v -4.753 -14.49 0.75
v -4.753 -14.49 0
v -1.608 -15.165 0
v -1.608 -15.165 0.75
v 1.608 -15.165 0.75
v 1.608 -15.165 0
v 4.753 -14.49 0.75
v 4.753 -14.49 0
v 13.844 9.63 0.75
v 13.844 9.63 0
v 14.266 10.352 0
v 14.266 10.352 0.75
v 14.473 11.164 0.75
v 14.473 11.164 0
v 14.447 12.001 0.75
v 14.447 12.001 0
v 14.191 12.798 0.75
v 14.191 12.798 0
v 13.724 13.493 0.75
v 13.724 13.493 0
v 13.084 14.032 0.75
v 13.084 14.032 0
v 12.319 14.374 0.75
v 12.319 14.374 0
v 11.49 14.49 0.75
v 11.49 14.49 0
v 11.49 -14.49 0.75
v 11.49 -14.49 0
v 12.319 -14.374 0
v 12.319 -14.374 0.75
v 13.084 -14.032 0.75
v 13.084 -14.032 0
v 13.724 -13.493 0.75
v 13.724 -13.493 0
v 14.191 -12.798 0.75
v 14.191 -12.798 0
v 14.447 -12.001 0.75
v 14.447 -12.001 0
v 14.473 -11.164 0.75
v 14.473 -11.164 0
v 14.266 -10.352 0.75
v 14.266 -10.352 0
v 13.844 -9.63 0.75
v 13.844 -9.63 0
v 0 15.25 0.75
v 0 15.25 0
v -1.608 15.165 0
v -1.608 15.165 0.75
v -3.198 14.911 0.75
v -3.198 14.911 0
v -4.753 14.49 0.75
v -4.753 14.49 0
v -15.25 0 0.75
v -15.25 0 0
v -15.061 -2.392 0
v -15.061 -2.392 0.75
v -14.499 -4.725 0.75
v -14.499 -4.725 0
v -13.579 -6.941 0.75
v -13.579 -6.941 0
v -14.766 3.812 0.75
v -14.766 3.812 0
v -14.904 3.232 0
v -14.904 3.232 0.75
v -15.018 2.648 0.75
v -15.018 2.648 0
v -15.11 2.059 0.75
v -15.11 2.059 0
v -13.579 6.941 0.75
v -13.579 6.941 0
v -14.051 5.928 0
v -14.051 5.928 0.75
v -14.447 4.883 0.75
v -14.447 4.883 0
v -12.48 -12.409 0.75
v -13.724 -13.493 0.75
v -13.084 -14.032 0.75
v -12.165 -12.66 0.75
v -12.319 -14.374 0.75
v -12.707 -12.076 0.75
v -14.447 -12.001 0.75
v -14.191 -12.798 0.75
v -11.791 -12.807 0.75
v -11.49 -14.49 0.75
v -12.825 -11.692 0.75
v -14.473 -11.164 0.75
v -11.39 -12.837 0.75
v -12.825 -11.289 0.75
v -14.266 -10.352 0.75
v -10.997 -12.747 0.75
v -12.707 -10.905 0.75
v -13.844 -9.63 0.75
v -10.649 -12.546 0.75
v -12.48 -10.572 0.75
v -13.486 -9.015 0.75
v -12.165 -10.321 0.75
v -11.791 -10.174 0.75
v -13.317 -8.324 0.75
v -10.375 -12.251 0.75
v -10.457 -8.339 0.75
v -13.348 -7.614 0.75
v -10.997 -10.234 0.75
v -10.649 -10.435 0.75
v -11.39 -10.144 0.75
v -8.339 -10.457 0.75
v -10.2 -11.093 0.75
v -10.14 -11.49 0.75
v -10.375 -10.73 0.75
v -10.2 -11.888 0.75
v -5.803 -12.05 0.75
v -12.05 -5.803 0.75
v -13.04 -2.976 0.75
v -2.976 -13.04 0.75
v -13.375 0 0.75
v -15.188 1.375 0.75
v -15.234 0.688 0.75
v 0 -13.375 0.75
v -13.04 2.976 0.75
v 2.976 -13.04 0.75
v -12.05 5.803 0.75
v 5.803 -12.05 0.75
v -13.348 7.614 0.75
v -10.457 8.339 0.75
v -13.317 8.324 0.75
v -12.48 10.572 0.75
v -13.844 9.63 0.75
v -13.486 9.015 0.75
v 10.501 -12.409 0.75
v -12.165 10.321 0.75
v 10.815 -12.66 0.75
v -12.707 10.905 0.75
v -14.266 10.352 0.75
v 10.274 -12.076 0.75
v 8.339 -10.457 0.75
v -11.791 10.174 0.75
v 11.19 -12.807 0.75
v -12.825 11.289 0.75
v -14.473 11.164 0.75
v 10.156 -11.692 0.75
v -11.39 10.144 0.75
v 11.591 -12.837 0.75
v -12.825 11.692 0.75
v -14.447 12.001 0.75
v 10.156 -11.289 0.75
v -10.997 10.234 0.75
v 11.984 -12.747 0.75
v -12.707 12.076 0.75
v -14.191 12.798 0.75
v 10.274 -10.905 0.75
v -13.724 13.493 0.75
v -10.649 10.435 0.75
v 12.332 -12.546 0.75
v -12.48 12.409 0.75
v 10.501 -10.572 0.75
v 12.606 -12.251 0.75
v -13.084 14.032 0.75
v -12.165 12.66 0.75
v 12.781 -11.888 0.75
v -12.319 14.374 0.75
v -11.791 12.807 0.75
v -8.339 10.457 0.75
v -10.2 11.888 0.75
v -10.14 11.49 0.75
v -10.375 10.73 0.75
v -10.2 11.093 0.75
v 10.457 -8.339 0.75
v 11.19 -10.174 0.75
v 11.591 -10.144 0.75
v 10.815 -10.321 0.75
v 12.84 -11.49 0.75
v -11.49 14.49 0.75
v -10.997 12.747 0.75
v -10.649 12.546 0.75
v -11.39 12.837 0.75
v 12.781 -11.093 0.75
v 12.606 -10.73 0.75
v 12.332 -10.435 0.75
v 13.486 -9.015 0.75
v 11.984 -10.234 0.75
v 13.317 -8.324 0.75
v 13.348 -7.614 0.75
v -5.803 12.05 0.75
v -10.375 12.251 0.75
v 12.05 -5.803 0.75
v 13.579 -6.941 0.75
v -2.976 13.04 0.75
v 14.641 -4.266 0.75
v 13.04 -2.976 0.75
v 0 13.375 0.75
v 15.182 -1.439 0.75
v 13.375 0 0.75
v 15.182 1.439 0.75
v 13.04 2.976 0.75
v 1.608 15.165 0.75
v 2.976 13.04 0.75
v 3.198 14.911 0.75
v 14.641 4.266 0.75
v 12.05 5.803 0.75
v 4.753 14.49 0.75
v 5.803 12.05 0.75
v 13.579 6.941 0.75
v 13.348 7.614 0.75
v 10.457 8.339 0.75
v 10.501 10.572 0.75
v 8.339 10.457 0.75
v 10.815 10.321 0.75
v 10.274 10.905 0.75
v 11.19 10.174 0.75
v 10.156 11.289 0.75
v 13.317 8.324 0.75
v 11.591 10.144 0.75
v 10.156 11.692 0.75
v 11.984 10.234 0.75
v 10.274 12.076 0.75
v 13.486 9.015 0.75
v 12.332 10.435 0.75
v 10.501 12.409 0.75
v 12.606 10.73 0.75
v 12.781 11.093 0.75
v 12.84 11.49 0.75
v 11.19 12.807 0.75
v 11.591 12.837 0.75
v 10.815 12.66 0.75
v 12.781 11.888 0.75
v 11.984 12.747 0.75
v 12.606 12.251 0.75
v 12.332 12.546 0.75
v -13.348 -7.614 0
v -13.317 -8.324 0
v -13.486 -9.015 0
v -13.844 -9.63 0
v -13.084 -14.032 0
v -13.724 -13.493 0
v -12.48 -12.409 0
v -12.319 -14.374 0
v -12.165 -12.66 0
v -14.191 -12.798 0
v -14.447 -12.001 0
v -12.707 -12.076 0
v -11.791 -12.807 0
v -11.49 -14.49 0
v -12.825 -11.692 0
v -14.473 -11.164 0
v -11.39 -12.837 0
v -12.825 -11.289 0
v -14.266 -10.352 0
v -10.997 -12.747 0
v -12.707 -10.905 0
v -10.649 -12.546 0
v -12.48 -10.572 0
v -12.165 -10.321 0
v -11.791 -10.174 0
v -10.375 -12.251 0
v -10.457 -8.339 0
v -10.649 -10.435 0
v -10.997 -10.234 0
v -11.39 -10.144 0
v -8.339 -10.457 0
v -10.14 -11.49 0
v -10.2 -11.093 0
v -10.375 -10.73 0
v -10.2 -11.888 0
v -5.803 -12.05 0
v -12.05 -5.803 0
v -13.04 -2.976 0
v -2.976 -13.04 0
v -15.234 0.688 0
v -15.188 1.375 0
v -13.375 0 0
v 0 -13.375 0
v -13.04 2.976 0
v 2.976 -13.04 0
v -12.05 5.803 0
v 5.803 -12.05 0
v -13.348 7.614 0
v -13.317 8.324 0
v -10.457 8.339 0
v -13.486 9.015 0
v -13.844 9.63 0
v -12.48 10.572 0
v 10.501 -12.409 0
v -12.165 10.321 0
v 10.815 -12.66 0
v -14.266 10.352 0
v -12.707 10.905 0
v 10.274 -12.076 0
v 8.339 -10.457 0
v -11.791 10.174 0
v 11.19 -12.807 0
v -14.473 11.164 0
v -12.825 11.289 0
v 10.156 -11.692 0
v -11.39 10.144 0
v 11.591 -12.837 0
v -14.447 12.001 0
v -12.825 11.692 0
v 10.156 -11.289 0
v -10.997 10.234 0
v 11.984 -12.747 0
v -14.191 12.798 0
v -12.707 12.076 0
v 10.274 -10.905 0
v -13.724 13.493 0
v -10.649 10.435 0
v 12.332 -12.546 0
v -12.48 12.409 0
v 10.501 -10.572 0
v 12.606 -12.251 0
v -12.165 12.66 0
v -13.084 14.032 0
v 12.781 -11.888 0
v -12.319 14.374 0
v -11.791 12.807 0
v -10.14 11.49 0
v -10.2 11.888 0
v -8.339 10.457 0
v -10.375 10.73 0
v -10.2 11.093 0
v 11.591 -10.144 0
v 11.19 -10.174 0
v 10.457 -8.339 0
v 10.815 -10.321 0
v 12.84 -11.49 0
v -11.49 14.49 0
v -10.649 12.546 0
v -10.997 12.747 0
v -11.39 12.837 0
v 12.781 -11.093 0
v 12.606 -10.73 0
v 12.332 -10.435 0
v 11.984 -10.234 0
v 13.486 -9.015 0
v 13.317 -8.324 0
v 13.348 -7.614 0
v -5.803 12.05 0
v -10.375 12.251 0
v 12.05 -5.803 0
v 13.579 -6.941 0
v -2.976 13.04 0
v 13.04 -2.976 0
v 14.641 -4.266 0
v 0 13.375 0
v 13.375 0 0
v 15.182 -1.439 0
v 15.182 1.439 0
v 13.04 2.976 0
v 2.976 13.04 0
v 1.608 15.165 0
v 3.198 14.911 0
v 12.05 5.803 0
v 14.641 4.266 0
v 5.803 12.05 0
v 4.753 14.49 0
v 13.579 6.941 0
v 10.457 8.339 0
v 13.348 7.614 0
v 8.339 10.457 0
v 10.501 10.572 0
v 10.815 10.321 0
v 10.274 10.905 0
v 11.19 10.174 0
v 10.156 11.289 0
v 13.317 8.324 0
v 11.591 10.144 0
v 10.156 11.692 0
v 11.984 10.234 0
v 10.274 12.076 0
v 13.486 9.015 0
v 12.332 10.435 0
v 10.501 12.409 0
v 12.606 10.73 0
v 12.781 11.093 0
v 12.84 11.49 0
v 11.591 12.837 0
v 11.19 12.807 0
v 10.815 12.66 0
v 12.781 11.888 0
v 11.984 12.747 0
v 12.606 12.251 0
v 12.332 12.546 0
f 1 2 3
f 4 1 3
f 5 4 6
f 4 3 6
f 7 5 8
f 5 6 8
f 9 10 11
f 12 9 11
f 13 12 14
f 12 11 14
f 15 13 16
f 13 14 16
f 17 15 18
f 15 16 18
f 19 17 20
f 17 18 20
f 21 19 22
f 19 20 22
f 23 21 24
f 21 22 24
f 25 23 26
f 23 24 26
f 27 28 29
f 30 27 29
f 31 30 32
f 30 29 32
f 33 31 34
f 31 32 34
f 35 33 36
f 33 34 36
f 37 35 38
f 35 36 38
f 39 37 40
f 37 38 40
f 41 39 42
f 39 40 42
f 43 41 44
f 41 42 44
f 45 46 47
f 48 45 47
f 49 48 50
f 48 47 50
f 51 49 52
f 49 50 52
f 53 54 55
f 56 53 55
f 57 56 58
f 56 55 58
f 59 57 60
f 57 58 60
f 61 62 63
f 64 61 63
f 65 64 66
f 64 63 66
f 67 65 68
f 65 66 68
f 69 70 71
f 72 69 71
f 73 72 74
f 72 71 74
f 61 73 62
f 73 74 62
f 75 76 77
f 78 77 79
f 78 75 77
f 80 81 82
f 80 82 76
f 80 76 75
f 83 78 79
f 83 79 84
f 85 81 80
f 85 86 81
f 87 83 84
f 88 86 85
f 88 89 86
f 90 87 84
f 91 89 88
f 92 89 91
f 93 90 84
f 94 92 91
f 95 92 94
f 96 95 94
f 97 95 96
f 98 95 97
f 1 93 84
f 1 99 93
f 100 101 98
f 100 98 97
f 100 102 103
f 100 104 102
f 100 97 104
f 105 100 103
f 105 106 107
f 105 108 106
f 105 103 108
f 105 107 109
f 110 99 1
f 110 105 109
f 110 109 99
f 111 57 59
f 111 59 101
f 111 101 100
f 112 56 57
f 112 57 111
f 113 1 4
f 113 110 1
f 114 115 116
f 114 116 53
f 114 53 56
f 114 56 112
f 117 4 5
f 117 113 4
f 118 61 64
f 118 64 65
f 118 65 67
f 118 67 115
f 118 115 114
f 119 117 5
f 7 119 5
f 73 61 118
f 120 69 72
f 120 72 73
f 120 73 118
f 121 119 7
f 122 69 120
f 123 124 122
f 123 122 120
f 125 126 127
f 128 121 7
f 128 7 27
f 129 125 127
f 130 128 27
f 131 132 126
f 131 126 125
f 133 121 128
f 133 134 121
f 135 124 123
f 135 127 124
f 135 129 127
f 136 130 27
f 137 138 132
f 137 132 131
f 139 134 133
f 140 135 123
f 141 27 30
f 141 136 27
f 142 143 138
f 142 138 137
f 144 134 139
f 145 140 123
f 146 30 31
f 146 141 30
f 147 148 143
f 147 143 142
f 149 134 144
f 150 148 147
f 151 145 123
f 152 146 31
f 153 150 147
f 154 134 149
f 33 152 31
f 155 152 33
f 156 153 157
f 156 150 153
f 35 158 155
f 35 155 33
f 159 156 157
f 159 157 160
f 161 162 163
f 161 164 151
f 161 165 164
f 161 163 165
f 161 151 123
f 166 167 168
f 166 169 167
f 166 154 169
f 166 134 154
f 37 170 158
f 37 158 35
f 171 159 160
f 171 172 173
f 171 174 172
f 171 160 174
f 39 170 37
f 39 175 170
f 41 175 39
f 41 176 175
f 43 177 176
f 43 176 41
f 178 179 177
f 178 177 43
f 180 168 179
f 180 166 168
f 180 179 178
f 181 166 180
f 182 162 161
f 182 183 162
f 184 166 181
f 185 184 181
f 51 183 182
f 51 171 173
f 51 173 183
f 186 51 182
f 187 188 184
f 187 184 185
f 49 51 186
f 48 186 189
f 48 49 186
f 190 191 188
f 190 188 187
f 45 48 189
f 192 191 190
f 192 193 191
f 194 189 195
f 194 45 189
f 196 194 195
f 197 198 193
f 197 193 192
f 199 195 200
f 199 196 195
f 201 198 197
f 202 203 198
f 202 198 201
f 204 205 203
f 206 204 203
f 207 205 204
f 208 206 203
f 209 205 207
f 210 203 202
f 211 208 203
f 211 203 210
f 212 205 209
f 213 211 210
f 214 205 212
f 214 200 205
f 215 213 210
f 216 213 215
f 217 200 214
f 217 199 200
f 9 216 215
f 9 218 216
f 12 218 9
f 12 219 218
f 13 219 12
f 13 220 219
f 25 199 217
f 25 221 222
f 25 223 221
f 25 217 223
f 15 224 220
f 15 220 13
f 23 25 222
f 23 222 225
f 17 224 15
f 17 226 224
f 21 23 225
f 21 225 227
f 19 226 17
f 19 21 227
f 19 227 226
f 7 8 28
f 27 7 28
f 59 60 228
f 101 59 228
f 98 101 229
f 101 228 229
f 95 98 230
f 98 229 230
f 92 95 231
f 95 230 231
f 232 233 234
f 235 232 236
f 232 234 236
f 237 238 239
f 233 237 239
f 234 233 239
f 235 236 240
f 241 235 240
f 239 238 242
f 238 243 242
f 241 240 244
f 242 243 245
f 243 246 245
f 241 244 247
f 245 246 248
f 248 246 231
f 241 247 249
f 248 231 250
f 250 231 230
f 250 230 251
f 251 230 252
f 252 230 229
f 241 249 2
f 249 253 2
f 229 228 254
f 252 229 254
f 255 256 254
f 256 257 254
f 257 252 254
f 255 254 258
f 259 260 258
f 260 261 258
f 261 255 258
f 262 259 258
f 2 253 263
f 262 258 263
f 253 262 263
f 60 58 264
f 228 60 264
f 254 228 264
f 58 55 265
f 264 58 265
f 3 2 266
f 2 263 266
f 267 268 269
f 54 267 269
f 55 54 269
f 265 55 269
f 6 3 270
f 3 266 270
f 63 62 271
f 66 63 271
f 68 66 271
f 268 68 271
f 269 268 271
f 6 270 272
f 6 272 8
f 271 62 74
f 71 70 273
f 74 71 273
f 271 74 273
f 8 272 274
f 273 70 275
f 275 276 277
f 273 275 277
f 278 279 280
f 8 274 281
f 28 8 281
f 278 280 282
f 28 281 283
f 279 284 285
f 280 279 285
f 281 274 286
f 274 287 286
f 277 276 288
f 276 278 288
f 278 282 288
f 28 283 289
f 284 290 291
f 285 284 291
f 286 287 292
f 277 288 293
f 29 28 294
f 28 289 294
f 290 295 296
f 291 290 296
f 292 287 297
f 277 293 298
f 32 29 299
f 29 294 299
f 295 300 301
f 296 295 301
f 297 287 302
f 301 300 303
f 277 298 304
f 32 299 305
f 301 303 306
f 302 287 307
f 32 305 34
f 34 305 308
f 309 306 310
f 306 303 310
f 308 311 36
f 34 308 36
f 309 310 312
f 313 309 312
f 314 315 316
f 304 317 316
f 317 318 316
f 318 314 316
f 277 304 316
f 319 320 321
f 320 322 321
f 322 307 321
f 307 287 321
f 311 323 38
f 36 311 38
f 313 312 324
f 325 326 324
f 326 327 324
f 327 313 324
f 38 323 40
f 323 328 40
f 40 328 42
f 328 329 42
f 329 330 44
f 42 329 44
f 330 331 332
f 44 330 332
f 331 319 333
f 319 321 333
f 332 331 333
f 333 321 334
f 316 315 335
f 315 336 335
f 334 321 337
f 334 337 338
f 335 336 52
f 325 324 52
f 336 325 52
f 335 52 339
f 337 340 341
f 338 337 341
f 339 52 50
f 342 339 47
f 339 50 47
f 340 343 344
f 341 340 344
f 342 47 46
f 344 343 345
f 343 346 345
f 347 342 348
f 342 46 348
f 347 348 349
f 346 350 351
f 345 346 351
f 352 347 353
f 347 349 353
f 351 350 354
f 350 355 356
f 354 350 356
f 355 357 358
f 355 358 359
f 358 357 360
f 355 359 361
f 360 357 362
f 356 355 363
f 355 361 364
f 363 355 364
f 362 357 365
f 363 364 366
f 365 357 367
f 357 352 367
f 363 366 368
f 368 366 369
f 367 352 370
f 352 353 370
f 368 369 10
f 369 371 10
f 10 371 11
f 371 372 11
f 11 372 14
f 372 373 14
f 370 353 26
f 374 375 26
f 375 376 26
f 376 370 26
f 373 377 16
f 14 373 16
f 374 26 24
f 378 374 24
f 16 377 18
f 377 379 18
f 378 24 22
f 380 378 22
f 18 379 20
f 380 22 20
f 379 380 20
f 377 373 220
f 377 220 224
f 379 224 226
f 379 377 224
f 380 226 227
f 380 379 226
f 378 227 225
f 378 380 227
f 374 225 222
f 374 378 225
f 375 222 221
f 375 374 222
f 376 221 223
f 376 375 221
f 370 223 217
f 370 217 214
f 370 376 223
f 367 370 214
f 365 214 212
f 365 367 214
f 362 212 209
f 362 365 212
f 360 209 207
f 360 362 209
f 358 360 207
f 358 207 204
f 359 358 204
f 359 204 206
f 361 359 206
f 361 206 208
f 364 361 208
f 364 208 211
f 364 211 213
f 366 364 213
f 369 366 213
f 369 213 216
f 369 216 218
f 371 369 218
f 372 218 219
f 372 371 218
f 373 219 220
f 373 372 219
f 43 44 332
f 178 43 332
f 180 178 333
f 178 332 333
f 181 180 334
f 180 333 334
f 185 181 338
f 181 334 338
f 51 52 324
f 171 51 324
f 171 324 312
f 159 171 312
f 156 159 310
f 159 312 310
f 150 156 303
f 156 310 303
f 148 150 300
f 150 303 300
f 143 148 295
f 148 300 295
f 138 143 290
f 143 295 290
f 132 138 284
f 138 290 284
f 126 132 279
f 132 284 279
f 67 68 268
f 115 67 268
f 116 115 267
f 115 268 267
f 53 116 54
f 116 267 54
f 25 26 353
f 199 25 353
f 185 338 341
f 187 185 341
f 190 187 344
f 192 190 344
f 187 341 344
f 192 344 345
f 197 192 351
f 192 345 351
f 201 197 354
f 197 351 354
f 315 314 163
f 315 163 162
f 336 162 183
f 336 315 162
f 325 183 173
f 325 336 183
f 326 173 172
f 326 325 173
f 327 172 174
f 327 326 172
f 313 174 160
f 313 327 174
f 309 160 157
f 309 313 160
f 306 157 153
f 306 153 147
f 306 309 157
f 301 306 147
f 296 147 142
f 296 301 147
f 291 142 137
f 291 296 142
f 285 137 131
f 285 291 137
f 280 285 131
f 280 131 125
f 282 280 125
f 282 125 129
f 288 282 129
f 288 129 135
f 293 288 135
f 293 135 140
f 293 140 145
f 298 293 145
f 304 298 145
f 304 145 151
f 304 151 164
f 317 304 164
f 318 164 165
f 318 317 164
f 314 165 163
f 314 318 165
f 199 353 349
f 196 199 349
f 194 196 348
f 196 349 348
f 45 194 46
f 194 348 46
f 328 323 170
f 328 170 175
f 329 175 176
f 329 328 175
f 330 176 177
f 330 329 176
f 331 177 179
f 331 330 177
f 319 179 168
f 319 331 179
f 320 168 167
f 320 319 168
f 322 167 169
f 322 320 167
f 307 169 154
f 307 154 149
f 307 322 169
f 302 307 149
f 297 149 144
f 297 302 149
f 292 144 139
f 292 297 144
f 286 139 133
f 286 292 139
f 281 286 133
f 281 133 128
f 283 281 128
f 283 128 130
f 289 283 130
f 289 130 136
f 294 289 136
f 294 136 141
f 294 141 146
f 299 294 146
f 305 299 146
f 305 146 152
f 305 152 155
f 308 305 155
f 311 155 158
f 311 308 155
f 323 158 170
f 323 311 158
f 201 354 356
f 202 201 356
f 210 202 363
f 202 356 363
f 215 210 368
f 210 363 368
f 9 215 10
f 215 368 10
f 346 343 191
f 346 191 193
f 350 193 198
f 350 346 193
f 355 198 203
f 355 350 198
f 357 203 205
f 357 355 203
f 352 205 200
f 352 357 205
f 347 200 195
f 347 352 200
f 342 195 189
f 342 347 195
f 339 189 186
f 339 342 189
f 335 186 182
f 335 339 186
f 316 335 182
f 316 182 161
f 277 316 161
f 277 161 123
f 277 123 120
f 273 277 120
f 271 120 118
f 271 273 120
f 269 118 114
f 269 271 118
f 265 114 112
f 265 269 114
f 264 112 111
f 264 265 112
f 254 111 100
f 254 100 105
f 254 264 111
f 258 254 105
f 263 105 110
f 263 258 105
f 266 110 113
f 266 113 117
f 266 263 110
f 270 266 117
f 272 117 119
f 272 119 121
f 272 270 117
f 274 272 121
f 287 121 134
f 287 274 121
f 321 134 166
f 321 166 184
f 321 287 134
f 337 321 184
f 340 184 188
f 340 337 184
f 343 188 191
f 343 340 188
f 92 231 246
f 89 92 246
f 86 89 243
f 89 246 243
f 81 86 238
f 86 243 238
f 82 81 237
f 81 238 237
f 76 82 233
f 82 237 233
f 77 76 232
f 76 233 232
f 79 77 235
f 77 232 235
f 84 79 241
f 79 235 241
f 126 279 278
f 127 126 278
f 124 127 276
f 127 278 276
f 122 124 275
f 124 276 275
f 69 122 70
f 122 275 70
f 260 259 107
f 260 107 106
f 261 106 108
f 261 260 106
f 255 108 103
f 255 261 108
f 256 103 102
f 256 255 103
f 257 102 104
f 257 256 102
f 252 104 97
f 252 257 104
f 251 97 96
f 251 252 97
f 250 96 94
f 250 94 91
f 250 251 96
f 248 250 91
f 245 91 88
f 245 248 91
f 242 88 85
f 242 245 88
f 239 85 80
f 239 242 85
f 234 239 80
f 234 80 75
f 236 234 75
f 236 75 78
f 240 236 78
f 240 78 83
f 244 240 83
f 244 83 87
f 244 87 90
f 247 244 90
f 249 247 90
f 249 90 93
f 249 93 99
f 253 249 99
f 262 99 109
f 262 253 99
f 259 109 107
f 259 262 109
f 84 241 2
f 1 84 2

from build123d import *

# Parameters (mm, degrees)
ESQUISSE1_R          = 13.375
ESQUISSE1_R_2        = 1.35
BASE_EXTRUSION_DEPTH = 0.75


with BuildPart() as part:
    # Esquisse1 → Base-Extrusion (new body)
    with BuildSketch(Plane.XY):
        with BuildLine():
            Line((-4.752719099, 14.490485194), (-11.490485194, 14.490485194))
            ThreePointArc((-11.490485194, 14.490485194), (-14.190687351, 12.797737393), (-13.843715332, 9.629757402))
            ThreePointArc((-13.843715332, 9.629757402), (-13.316796605, 8.324376183), (-13.578720666, 6.941242329))
            ThreePointArc((-13.578720666, 6.941242329), (-14.258481428, 5.409085631), (-14.765986011, 3.811581971))
            ThreePointArc((-14.765986011, 3.811581971), (-14.96384856, 2.940363289), (-15.110354082, 2.059053064))
            ThreePointArc((-15.110354082, 2.059053064), (-15.215048468, 1.031891528), (-15.25, 0))
            ThreePointArc((-15.25, 0), (-14.826294044, -3.569804606), (-13.578720666, -6.941242329))
            ThreePointArc((-13.578720666, -6.941242329), (-13.316796605, -8.324376183), (-13.843715332, -9.629757402))
            ThreePointArc((-13.843715332, -9.629757402), (-14.190687351, -12.797737393), (-11.490485194, -14.490485194))
            Line((-11.490485194, -14.490485194), (-4.752719099, -14.490485194))
            ThreePointArc((-4.752719099, -14.490485194), (0, -15.25), (4.752719099, -14.490485194))
            Line((4.752719099, -14.490485194), (11.490485194, -14.490485194))
            ThreePointArc((11.490485194, -14.490485194), (14.190687351, -12.797737393), (13.843715332, -9.629757402))
            ThreePointArc((13.843715332, -9.629757402), (13.316796605, -8.324376183), (13.578720666, -6.941242329))
            ThreePointArc((13.578720666, -6.941242329), (15.25, 0), (13.578720666, 6.941242329))
            ThreePointArc((13.578720666, 6.941242329), (13.316796605, 8.324376183), (13.843715332, 9.629757402))
            ThreePointArc((13.843715332, 9.629757402), (14.190687351, 12.797737393), (11.490485194, 14.490485194))
            Line((11.490485194, 14.490485194), (4.752719099, 14.490485194))
            ThreePointArc((4.752719099, 14.490485194), (2.406512081, 15.058924251), (0, 15.25))
            ThreePointArc((0, 15.25), (-2.406512081, 15.058924251), (-4.752719099, 14.490485194))
        make_face()
        Circle(ESQUISSE1_R, mode=Mode.SUBTRACT)
        with Locations((-11.490485194, -11.490485194)):
            Circle(ESQUISSE1_R_2, mode=Mode.SUBTRACT)
        with Locations((-11.490485194, 11.490485194)):
            Circle(ESQUISSE1_R_2, mode=Mode.SUBTRACT)
        with Locations((11.490485194, 11.490485194)):
            Circle(ESQUISSE1_R_2, mode=Mode.SUBTRACT)
        with Locations((11.490485194, -11.490485194)):
            Circle(ESQUISSE1_R_2, mode=Mode.SUBTRACT)
    extrude(amount=BASE_EXTRUSION_DEPTH)


solid = part.part
